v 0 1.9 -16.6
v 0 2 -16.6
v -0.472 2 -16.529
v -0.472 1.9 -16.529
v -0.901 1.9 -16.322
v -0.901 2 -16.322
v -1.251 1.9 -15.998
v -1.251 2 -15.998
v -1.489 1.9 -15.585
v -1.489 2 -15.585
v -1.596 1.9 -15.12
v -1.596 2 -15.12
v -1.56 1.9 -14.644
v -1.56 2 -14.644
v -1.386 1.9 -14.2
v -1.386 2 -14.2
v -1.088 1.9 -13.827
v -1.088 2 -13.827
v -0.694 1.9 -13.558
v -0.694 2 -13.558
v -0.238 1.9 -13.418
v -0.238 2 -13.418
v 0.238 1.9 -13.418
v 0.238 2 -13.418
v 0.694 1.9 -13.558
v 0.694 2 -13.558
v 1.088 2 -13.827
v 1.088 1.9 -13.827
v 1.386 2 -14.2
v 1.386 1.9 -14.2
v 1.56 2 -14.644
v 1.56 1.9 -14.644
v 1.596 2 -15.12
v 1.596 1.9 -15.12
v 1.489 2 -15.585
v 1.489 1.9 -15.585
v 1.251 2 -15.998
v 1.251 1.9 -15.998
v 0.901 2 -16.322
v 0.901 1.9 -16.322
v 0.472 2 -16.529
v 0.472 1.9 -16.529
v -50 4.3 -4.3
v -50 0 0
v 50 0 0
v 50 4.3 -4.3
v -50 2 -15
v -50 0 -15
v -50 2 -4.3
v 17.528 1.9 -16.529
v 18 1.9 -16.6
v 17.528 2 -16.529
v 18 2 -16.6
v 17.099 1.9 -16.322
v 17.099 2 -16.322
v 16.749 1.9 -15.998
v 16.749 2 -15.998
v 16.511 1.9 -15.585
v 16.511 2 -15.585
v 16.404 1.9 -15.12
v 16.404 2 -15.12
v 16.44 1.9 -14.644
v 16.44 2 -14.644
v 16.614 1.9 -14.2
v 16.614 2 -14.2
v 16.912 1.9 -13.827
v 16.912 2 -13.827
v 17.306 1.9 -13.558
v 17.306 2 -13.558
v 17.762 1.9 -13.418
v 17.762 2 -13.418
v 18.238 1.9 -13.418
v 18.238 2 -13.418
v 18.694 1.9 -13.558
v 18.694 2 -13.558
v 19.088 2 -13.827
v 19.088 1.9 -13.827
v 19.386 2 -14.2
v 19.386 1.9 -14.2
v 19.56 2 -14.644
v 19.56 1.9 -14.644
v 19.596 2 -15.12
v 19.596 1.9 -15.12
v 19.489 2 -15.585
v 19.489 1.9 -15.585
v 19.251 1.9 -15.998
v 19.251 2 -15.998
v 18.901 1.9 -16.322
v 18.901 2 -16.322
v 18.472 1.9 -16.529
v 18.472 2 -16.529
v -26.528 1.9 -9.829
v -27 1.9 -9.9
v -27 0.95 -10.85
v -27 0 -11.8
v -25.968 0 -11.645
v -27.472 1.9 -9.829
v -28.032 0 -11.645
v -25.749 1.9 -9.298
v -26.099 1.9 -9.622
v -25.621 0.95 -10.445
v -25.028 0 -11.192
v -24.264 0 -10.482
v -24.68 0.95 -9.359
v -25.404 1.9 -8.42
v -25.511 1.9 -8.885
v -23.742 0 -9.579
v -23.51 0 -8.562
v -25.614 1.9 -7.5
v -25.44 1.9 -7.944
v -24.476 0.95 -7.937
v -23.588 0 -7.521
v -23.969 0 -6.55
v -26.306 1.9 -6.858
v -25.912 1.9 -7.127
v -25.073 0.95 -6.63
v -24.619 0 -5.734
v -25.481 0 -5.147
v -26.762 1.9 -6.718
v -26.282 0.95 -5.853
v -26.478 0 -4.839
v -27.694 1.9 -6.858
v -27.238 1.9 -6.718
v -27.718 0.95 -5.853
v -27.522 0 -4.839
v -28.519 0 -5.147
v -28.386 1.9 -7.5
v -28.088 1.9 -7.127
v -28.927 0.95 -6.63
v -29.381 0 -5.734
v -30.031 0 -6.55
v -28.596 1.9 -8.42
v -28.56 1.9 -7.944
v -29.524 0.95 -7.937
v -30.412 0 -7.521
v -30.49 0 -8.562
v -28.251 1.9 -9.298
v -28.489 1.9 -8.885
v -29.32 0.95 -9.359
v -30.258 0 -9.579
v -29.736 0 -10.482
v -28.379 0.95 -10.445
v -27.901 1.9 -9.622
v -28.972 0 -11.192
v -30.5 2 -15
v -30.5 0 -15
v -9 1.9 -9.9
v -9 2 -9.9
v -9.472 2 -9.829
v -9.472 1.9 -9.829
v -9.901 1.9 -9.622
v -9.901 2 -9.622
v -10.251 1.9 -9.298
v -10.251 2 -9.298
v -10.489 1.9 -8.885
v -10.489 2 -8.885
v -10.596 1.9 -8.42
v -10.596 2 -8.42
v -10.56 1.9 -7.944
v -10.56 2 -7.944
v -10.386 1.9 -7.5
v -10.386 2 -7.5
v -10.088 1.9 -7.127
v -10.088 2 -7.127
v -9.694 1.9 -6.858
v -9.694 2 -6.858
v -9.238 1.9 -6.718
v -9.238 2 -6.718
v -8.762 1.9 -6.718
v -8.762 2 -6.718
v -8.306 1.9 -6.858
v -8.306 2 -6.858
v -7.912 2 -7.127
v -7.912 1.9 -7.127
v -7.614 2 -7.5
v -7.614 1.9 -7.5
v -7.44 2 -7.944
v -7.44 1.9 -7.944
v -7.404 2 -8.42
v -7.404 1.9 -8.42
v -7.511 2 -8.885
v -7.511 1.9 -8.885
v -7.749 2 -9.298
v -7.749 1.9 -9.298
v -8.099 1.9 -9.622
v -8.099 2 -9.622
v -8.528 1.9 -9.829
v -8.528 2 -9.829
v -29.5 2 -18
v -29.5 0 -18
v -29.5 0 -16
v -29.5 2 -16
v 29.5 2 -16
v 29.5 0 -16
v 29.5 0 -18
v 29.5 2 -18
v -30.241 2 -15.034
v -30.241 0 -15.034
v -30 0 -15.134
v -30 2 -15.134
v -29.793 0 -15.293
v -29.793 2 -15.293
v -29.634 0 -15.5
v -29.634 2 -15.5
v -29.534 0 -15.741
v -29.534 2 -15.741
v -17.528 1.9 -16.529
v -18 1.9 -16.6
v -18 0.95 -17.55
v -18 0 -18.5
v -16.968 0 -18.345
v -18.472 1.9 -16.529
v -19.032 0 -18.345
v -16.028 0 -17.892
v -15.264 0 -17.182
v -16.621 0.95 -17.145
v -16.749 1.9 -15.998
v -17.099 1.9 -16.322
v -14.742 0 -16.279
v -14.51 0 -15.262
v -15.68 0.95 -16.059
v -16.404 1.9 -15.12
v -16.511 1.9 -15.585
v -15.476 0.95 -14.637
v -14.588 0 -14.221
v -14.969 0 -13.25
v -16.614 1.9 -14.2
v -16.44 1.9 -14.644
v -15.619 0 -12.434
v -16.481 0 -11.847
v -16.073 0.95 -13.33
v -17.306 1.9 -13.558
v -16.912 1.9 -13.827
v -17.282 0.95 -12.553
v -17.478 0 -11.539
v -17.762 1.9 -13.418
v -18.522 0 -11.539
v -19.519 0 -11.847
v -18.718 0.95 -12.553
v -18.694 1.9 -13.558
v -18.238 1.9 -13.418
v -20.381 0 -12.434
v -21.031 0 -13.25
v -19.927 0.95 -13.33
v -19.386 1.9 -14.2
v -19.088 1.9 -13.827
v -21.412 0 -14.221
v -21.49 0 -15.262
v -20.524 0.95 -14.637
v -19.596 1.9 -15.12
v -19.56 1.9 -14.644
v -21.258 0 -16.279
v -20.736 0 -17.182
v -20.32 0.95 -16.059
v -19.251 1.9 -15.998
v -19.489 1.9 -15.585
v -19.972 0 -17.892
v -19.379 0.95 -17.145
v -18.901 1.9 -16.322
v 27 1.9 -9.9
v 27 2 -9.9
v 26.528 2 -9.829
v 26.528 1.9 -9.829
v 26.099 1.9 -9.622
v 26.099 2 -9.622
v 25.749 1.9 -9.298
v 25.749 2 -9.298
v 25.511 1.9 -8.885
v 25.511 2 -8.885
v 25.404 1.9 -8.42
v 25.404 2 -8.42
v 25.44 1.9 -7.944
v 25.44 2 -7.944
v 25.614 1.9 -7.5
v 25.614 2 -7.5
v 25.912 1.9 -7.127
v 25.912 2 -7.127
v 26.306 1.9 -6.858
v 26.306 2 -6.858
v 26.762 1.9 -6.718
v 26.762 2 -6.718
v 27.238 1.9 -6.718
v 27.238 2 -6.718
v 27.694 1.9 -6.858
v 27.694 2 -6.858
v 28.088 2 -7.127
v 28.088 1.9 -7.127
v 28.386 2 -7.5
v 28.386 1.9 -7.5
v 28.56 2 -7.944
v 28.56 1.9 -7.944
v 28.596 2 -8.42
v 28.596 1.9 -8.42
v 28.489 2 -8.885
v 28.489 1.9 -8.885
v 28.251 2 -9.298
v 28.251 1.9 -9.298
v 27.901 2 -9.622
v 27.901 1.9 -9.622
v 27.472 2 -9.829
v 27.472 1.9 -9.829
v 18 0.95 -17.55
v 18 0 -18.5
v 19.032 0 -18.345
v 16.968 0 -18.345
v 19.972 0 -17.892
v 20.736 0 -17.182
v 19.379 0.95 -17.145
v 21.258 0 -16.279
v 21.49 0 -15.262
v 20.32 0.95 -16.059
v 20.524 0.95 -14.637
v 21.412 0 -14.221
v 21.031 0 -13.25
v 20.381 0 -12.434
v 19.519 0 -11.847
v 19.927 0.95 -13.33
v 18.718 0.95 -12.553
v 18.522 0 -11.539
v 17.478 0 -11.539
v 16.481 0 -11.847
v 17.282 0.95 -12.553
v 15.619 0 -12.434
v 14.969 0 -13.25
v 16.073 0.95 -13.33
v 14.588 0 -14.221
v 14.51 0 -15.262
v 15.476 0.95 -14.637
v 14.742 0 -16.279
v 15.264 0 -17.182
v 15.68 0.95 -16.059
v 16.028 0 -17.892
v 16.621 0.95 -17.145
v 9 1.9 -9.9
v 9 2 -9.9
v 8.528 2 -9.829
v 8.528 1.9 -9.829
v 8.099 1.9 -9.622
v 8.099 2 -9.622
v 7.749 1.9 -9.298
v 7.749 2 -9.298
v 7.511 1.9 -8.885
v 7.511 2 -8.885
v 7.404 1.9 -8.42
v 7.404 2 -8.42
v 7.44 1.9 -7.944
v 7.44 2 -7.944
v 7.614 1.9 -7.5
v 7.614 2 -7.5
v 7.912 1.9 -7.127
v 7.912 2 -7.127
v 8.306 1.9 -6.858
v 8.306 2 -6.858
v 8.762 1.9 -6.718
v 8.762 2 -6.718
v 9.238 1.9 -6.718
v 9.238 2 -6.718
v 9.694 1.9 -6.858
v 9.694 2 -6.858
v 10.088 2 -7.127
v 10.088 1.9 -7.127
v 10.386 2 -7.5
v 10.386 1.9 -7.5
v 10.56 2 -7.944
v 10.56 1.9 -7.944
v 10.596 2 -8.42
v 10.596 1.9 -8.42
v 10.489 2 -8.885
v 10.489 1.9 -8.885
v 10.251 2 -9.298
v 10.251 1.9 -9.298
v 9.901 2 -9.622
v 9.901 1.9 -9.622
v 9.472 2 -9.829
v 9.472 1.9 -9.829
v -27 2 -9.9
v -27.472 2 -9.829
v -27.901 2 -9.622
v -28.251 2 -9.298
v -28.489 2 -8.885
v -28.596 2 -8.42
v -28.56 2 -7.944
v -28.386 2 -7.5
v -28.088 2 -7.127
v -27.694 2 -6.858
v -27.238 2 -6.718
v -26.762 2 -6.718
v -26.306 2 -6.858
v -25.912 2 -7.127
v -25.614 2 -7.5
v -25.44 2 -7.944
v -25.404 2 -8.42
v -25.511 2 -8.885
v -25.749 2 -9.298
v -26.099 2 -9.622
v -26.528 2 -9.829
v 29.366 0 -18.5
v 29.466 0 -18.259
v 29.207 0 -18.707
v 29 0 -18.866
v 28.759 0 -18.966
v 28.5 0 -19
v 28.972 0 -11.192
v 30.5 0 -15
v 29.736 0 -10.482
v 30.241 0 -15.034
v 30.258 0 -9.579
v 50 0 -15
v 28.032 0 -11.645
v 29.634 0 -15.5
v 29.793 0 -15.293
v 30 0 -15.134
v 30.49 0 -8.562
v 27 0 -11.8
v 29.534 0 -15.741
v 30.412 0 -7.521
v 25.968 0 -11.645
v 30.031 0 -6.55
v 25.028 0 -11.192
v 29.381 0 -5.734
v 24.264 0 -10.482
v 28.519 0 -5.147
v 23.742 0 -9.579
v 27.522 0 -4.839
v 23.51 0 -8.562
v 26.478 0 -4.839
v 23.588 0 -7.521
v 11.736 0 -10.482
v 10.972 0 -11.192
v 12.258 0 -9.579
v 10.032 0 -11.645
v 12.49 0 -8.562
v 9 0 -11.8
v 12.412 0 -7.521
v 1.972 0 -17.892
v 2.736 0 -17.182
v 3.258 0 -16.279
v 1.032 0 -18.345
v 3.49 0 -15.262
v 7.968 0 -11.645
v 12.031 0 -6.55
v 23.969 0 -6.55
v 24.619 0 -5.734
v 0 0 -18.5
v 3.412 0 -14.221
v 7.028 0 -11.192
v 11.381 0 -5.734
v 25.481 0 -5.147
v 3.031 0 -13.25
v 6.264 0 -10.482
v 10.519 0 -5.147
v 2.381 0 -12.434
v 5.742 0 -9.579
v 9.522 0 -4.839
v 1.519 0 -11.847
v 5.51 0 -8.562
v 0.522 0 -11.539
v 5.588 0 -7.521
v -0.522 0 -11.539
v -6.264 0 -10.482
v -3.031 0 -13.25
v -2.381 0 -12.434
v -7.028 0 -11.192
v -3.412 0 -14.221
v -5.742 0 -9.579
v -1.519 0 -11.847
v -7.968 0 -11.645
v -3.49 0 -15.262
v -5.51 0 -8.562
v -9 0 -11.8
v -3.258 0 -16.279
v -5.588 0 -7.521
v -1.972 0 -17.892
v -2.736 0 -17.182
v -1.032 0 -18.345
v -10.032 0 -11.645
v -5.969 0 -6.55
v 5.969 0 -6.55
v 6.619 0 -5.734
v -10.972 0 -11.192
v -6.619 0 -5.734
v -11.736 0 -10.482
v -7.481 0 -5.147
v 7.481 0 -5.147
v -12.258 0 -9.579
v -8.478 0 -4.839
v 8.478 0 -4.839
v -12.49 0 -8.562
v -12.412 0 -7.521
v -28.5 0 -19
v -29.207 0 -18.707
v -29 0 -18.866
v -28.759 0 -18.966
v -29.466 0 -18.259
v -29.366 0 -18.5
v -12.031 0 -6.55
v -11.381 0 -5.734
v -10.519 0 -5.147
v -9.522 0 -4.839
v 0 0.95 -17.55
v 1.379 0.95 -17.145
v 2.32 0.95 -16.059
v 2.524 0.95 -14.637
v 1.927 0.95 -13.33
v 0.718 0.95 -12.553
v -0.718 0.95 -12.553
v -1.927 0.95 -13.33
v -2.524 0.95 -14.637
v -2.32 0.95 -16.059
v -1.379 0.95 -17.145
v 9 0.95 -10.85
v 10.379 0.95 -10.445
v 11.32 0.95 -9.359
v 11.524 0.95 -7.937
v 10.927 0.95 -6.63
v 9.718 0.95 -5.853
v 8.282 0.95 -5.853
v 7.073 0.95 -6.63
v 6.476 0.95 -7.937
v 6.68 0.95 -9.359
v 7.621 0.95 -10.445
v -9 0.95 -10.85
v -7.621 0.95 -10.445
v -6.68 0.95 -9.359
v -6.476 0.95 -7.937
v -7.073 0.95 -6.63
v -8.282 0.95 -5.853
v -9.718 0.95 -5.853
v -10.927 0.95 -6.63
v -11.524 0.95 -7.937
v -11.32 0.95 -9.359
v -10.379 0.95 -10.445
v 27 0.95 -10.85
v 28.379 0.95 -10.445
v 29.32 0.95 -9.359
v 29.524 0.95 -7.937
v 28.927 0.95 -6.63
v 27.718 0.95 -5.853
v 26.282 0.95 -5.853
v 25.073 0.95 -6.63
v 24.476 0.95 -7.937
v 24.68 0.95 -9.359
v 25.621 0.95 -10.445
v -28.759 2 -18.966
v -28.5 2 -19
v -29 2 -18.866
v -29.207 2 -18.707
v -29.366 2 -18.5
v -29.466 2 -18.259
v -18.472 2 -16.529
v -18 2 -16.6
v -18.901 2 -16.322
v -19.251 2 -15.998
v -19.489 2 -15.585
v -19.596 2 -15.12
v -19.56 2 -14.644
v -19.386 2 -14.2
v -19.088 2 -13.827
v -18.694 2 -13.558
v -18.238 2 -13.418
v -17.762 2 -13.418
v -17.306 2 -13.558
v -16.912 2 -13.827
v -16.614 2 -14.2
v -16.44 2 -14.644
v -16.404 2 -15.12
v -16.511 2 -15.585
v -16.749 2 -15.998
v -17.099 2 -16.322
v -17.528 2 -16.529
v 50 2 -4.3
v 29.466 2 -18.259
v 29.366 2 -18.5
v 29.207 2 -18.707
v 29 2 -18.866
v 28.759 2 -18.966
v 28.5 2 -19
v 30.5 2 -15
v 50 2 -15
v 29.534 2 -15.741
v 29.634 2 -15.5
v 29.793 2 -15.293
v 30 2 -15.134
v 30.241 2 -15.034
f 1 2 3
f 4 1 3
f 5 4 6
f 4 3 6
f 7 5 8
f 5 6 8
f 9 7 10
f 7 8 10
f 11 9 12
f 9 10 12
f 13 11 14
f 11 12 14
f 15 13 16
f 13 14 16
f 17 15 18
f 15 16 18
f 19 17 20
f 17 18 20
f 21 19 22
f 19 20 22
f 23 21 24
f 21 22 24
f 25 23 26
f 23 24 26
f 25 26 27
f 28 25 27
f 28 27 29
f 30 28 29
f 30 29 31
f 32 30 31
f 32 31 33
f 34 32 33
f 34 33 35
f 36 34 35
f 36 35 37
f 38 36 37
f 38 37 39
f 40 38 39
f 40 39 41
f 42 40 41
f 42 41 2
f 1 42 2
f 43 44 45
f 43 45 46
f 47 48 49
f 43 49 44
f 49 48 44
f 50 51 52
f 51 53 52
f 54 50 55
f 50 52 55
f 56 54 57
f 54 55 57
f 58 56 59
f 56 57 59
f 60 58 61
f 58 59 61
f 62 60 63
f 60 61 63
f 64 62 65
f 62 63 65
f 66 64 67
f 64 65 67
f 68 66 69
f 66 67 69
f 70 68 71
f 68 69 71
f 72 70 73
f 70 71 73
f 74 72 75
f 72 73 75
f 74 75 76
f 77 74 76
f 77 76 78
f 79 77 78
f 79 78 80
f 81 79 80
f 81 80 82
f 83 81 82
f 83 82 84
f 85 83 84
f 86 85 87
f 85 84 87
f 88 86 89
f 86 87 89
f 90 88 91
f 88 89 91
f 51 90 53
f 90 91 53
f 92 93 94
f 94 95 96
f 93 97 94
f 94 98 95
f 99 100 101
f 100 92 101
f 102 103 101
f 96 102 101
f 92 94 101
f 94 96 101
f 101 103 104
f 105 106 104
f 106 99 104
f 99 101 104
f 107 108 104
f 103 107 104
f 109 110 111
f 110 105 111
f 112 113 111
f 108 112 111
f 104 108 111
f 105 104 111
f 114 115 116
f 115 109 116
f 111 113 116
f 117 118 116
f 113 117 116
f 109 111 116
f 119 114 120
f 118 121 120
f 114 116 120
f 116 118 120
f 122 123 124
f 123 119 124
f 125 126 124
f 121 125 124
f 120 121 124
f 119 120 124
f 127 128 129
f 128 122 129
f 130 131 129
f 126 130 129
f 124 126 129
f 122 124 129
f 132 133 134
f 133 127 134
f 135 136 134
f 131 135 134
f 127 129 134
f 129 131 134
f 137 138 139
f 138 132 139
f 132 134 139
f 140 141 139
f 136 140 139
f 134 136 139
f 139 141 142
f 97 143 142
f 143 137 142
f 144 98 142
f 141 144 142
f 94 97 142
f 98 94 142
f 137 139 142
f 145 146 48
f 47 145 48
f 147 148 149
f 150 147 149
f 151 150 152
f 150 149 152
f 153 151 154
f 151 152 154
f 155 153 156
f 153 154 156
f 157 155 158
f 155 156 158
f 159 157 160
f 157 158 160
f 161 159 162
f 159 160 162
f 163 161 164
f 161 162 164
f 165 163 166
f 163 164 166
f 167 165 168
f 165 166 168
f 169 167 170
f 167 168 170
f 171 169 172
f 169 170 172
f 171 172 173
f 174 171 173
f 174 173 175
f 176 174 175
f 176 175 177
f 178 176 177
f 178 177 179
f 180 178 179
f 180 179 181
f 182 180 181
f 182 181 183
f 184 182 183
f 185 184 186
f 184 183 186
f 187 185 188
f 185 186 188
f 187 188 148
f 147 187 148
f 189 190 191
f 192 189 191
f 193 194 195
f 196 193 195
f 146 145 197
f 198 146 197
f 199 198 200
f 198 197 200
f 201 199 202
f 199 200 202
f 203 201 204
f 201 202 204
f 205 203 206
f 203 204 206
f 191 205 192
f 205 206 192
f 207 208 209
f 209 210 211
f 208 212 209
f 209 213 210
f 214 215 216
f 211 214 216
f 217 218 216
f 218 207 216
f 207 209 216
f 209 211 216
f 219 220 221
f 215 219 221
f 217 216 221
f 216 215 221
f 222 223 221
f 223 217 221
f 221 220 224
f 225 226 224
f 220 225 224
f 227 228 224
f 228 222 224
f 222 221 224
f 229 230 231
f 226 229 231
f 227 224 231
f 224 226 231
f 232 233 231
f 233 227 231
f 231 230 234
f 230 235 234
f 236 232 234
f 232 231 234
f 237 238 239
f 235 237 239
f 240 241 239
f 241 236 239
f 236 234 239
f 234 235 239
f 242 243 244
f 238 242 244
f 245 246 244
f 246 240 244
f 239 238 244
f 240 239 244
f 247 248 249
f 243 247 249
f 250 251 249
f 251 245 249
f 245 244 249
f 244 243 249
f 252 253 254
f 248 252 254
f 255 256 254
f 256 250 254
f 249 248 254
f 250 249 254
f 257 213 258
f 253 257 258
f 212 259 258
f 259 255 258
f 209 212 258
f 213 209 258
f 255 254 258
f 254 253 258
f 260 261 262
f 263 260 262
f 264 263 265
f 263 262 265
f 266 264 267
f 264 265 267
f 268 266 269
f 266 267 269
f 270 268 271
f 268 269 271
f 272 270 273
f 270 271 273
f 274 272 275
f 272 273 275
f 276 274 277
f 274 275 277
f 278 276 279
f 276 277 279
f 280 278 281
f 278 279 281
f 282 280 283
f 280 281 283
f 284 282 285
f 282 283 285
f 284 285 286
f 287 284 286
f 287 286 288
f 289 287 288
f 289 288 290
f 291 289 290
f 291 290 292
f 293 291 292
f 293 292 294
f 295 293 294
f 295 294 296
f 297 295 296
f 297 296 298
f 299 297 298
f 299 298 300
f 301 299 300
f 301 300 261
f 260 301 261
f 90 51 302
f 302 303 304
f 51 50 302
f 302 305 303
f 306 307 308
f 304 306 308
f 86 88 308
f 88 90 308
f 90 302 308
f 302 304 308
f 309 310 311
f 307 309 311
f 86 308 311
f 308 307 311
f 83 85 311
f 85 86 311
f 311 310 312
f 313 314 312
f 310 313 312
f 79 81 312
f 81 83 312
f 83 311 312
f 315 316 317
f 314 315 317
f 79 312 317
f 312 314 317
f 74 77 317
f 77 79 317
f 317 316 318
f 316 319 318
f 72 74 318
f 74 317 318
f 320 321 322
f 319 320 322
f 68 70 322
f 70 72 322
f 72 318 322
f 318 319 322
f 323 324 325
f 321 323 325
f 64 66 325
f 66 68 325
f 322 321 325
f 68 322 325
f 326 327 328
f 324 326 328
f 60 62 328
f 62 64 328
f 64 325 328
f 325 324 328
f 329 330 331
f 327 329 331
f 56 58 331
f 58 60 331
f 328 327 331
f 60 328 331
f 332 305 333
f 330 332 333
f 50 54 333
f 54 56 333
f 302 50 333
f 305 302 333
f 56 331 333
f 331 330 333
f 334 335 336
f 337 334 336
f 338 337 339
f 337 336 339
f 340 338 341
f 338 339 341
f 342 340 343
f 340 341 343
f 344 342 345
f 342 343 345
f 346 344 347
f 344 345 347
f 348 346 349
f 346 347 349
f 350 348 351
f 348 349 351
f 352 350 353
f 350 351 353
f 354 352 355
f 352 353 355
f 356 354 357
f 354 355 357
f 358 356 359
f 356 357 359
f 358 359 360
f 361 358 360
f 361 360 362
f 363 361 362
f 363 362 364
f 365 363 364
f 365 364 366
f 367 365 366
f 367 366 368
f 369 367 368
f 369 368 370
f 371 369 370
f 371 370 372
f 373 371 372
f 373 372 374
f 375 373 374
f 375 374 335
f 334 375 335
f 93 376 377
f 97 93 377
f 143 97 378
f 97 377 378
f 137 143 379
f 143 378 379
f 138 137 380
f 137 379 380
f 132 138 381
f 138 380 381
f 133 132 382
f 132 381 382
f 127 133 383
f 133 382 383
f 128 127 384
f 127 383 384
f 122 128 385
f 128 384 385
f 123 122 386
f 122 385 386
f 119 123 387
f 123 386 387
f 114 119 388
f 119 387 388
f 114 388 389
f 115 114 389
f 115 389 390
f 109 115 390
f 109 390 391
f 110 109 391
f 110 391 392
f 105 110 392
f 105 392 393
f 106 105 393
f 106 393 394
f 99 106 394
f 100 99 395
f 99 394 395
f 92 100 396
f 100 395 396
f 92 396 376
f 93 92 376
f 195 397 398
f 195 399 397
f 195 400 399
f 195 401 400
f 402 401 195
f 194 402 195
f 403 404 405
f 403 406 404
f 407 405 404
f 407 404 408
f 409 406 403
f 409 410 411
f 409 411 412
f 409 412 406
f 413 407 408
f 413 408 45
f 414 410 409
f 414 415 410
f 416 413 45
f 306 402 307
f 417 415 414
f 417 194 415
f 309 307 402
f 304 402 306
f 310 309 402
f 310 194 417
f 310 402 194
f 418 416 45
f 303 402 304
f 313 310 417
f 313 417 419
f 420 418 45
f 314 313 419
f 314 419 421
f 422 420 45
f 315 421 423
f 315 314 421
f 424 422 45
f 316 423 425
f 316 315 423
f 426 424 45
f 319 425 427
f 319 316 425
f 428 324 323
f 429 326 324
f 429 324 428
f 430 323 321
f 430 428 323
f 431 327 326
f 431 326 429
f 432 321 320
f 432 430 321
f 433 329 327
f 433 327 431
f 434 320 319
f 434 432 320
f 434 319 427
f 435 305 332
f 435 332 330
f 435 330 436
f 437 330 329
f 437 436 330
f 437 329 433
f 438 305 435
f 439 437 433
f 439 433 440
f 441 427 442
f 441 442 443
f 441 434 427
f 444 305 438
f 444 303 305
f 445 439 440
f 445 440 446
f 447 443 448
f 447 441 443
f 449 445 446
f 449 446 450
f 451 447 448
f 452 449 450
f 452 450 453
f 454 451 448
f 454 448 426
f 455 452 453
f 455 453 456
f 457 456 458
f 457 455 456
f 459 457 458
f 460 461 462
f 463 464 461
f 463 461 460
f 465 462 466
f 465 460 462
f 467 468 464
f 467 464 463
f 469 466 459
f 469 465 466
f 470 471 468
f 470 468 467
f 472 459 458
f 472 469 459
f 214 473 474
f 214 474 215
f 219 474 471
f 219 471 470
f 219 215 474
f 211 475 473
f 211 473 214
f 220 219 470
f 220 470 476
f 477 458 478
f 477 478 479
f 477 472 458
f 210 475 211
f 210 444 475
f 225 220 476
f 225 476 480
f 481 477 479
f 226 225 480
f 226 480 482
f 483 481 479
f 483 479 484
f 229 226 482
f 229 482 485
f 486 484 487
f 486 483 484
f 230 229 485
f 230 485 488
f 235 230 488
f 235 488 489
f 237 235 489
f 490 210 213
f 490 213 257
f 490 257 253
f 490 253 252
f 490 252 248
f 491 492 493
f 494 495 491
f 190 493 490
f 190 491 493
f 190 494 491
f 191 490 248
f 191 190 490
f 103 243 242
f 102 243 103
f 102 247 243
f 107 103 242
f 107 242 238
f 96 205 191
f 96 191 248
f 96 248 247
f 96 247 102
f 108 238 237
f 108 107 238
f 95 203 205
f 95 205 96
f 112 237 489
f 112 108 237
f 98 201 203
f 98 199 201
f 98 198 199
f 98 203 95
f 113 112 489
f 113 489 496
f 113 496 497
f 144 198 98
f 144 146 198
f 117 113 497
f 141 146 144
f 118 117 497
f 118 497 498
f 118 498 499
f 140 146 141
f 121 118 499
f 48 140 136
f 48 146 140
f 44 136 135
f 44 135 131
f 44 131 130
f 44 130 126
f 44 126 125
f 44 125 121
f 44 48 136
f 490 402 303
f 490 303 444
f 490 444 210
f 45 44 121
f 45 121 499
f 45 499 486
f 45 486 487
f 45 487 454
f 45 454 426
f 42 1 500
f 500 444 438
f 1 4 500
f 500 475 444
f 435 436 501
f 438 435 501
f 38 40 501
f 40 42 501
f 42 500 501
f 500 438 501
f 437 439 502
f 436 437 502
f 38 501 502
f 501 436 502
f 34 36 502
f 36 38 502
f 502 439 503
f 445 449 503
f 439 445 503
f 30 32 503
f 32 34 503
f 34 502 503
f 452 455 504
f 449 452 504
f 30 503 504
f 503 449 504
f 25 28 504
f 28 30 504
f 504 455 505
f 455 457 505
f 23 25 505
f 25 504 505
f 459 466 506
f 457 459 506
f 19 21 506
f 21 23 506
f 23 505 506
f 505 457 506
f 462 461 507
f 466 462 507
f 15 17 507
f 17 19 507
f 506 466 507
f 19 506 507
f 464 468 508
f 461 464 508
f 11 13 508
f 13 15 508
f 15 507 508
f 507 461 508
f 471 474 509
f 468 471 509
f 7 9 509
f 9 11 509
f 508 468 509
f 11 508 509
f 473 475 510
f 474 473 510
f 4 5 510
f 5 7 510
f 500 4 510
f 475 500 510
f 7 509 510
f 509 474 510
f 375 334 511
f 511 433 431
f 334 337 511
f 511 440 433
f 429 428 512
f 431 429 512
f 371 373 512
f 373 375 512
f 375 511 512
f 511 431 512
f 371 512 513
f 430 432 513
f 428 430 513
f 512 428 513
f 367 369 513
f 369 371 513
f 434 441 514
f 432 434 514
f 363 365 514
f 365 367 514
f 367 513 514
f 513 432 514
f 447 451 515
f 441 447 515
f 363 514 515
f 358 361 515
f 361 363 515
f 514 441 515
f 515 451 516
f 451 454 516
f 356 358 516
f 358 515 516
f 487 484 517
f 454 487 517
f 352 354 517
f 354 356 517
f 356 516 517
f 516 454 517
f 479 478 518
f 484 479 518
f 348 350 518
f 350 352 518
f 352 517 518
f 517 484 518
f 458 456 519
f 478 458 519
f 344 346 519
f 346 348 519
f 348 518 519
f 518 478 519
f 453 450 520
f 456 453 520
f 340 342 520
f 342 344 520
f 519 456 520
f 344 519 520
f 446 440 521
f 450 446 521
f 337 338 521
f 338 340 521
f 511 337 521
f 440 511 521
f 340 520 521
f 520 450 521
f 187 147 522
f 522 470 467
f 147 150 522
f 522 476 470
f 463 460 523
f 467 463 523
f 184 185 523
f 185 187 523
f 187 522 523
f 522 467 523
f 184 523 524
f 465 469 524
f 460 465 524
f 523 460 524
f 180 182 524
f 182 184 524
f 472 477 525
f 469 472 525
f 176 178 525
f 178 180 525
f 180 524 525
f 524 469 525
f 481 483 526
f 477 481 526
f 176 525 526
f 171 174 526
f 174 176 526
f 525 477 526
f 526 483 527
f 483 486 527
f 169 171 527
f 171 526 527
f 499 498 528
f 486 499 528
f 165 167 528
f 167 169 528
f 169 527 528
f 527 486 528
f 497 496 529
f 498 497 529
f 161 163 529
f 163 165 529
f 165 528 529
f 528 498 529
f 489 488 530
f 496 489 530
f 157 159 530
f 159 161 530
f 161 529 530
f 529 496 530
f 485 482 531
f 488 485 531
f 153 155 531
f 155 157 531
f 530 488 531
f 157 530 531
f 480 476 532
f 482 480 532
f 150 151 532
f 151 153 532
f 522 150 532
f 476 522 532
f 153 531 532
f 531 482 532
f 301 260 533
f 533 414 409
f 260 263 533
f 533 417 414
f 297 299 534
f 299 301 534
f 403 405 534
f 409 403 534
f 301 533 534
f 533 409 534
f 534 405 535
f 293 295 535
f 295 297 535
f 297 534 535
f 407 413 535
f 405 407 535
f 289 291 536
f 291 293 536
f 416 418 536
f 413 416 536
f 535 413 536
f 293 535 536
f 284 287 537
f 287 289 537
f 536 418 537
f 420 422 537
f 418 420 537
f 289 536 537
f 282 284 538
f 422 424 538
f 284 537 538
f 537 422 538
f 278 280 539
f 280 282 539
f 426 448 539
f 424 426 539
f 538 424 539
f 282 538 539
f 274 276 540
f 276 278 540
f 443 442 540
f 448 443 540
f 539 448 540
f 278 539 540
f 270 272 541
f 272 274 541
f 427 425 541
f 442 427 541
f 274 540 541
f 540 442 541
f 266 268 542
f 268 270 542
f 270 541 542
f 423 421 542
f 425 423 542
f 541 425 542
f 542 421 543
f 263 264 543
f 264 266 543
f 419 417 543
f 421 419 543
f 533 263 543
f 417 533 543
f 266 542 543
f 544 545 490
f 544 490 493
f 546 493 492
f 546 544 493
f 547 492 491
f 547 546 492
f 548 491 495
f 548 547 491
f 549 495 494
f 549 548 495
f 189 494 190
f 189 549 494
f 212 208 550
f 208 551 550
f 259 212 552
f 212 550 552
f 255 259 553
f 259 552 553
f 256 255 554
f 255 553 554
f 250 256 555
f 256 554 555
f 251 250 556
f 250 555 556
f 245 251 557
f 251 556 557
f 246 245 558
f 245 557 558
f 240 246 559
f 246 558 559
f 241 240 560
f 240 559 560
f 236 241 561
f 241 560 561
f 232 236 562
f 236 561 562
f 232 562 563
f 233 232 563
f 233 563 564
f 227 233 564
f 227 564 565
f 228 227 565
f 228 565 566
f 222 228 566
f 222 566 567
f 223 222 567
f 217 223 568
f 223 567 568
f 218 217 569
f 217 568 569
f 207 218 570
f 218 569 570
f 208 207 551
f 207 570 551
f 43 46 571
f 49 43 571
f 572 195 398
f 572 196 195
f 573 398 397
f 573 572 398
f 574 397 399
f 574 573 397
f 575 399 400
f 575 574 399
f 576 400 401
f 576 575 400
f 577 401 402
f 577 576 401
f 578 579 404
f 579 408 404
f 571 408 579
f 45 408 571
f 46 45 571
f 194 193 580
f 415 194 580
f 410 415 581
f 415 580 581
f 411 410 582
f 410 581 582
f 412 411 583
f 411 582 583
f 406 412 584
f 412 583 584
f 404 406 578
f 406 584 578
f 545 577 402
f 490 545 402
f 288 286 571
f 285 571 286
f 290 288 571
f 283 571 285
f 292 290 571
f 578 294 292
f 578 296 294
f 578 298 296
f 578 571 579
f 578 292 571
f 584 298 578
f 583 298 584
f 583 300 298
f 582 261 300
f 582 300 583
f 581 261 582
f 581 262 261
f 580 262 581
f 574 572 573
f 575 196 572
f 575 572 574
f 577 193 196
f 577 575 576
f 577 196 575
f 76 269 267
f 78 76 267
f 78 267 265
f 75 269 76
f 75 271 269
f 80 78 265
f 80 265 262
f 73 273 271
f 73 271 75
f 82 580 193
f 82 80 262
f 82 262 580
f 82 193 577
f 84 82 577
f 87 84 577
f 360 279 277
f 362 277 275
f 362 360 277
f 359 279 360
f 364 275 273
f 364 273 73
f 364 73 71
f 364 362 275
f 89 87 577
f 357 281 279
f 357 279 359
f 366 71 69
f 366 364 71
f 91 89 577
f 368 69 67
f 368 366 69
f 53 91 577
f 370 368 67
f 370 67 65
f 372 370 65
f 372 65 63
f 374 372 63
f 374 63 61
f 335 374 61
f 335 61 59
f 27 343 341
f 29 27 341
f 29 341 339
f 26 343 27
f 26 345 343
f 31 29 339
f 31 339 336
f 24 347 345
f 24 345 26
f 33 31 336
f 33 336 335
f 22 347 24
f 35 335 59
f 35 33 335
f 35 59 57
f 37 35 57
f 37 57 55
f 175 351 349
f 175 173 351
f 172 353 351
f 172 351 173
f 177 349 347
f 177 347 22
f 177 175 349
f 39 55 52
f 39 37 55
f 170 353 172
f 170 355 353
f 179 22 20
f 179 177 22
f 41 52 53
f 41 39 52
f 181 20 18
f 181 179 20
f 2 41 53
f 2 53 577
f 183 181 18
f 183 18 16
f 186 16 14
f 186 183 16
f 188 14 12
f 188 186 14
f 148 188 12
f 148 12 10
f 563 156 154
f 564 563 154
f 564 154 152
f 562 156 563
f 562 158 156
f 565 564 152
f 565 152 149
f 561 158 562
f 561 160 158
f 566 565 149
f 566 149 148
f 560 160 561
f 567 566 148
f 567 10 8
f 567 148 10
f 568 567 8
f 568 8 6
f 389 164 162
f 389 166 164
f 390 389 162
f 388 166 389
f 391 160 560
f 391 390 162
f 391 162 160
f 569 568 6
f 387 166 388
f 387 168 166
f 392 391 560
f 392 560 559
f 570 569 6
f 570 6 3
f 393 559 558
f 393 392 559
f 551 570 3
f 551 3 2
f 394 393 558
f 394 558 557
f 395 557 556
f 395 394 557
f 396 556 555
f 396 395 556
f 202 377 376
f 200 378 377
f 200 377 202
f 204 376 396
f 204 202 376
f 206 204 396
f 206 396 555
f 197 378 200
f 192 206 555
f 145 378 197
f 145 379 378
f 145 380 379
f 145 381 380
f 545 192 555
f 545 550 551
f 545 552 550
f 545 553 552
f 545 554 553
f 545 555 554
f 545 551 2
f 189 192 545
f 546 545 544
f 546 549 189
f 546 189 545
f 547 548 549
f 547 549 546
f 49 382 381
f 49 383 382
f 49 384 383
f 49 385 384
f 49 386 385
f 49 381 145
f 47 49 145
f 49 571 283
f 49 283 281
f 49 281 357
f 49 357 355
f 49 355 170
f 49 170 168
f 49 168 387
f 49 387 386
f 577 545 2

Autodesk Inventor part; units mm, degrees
ref_plane "YZ Plane" through (0, 0, 0) normal (1, 0, 0) x (0, 1, 0)
ref_plane "XZ Plane" through (0, 0, 0) normal (0, 1, 0) x (-1, 0, 0)
ref_plane "XY Plane" through (0, 0, 0) normal (0, 0, 1) x (1, 0, 0)
sketch "Szkic1" plane through (0, 0, 0) normal (1, 0, 0) x (0, 1, 0)
  line L0 (0, 0) -> (2, -2)
  line L1 (2, -2) -> (2, -19)
  line L2 (2, -19) -> (0, -19)
  line L3 (0, -19) -> (0, -2)
  line L4 (0, -2) -> (0, 0)
  line L5 (0, -2) -> (2, -2)
  line L6 (2, -2) -> (4.3, -4.3)
  line L7 (4.3, -4.3) -> (2, -4.3)
  line L8 (2, -2) -> (4.3, -4.3)
  line L9 (4.3, -4.3) -> (2, -4.3)
  line L10 (4, -4) -> (4, -4.3) construction
  line L11 (4, -4) -> (2, -4) construction
  line L12 (4.3, -4.3) -> (4.3, -4.8)
  line L13 (4.3, -4.8) -> (2, -4.8)
  line L14 (0, 0) -> (-0.5, 0)
  line L15 (-0.5, 0) -> (-0.5, -19)
  line L16 (-0.5, -19) -> (0, -19)
  line L17 (0, -19) -> (0, 0)
  point P0 (5, -5)
  point P1 (4.3, -4.3)
  dimension "d1" = 2
  dimension "d2" = 45
  dimension "d44" = 45
  dimension "d45" = 2
  dimension "d46" = 17
  dimension "d50" = -4.3
  dimension "d51" = 19
  dimension "d54" = 0
  dimension "d98" = 2.3
  dimension "d125" = 4
  dimension "d126" = 0.3
  dimension "d156" = 0.5
  dimension "d157" = 0.5
extrude "Wyciągnięcie proste1" add sketch "Szkic1" along normal mid plane 100 contours L0 L5 L4 | L6 L7 L1 | L1 L2 L3 L5
sketch "Sketch4" plane through (-50, 0, -19) normal (0, -1, 0) x (1, 0, 0)
  line L0 (0, 0) -> (0, 19) projected
  line L1 (0, 0) -> (100, 0) projected
  line L2 (100, 19) -> (100, 0) projected
  line L3 (100, 19) -> (0, 19) projected
  line L4 (80, 0) -> (80, 19)
  line L5 (100, 19) -> (50, 19) projected
  line L6 (20, 19) -> (20, 0)
  line L7 (0, 0) -> (100, 0) projected
  line L8 (0, 14.7) -> (100, 14.7) projected
  circle A0 centre (77, 10.7) radius 3
  circle A1 centre (41, 10.7) radius 3
  circle A2 centre (23, 10.7) radius 3
  line L9 (80, 10.7) -> (20, 10.7)
  line L10 (80, 4) -> (20, 4)
  circle A3 centre (59, 10.7) radius 3
  circle A4 centre (68, 4) radius 3
  circle A5 centre (50, 4) radius 3
  circle A6 centre (32, 4) radius 3
  dimension "d67" = 6
  dimension "d70" = 6
  dimension "d22" = 20
  dimension "d23" = 20
  dimension "d69" = 6
  dimension "d75" = 18
  dimension "d127" = 6
  dimension "d129" = 18
  dimension "d139" = 18
  dimension "d140" = 6
  dimension "d141" = 6
  dimension "d142" = 6
  dimension "d143" = 9
  dimension "d144" = 9
  dimension "d145" = 9
  dimension "d146" = 9
  dimension "d147" = 9
  dimension "d148" = 9
  dimension "d149" = 4
  dimension "d150" = 4
hole "Hole2" at (27, 0, -8.3) at (-9, 0, -8.3) at (-27, 0, -8.3) at (9, 0, -8.3) at (0, 0, -15) at (18, 0, -15) at (-18, 0, -15) direction (0, 1, 0) diameter 3.2 depth 8.8 countersink diameter 7 countersink angle 90 clearance for "Countersunk Flat Head Screw ISO 2009/7046" size "M3" standard "ISO"
extrude "Extrusion7" [suppressed]
sketch "Sketch5" plane through (-50, 0, 0) normal (0, -1, 0) x (1, 0, 0)
  line L0 (100, 0) -> (100, -19) projected
  line L1 (100, 0) -> (0, 0) projected
  line L2 (0, -19) -> (0, 0) projected
  line L3 (100, -15) -> (79.5, -15)
  line L4 (79.5, -15) -> (79.5, -32.132)
  line L5 (79.5, -32.132) -> (100, -32.132)
  line L6 (100, -32.132) -> (100, -15)
  line L7 (0, -19) -> (20.5, -19)
  line L8 (20.5, -19) -> (20.5, -15)
  line L9 (20.5, -15) -> (0, -15)
  line L10 (0, -15) -> (0, -19)
  circle A0 centre (23, -8.3) radius 3.5 projected
  circle A1 centre (41, -8.3) radius 3.5 projected
  circle A2 centre (77, -8.3) radius 3.5 projected
  line L11 (0, -19) -> (100, -19) projected
  point P0 (50, 0)
  point P1 (0, -15)
  point P2 (100, -30)
  dimension "d55" = 20.5
  dimension "d56" = 20.5
  dimension "d61" = 15
  dimension "d62" = 15
extrude "Extrusion5" cut sketch "Sketch5" along normal through all both and the other way through all contours L0 L11 L4 L3 | L6 L5 L4 L11 | L9 L8 L7 L2
fillet "Fillet2" radius 1 2 edges at (-29.5, 1, -19) (29.5, 1, -19)
fillet "Fillet3" radius 1 2 edges at (-29.5, 1, -15) (29.5, 1, -15)
sketch "Sketch10" plane through (50, 0, 0) normal (1, 0, 0) x (0, 0, -1)
  line L0 (30.7582, 13.788) -> (30.3919, 3.2994) projected
  line L1 (30.5751, 8.5437) -> (-8.4118, 9.9052)
  line L2 (15, 0) -> (15, 2) projected
  line L3 (15, 2) -> (4.3, 2) projected
  line L4 (4.3, 2) -> (4.3, 4.3) projected
  line L5 (4.3, 4.3) -> (0, 0) projected
  line L6 (0, 0) -> (15, 0) projected
  line L7 (4.3, 2) -> (15, 2) projected
  line L8 (4.3, 2) -> (3.8, 2)
  circle A0 centre (63.2278, 12.35) radius 15 projected
  line L9 (63.2278, 12.35) -> (63.2278, -2.65)
  line L10 (63.2278, -2.65) -> (0, 0)
  line L11 (0, 0) -> (0.1802, 4.3)
  line L12 (0.1802, 4.3) -> (3.8, 4.3)
  line L13 (3.8, 4.3) -> (3.8, 2)
  line L14 (3.8, 4.3) -> (4.3, 4.3) construction
  point P0 (3.8, 3.8)
  dimension "d166" = 90
  dimension "d167" = 0.5
extrude "Extrusion9" [suppressed]
sketch "Sketch11" plane through (50, 0, 0) normal (1, 0, 0) x (0, 0, -1)
  line L0 (3.8, 4.3) -> (3.8, 2) projected
  line L1 (4.3, 2) -> (3.8, 2) projected
  line L2 (4.3, 2) -> (4.3, 4.3) projected
  line L3 (4.3, 4.3) -> (0, 0) projected
  point P0 (3.8, 3.8)
extrude "Extrusion10" [suppressed]
sketch "Sketch12" plane through (-28.5, 0, -19) normal (0, -1, 0) x (1, 0, 0)
  arc A0 (57, 0) -> (58, 1) centre (57, 1) ccw projected
  line L0 (58, 1) -> (58, 3) projected
  arc A1 (59, 4) -> (58, 3) centre (59, 3) ccw projected
  line L1 (59, 4) -> (78.5, 4) projected
  line L2 (78.5, 19) -> (78.5, 4) projected
  line L3 (78.5, 19) -> (-21.5, 19) projected
  line L4 (-21.5, 4) -> (-21.5, 19) projected
  line L5 (-21.5, 4) -> (-2, 4) projected
  arc A2 (-1, 3) -> (-2, 4) centre (-2, 3) ccw projected
  line L6 (-1, 3) -> (-1, 1) projected
  arc A3 (-1, 1) -> (0, 0) centre (0, 1) ccw projected
  line L7 (0, 0) -> (57, 0) projected
  circle A4 centre (55.5, 10.7) radius 3.5 projected
  circle A5 centre (19.5, 10.7) radius 3.5 projected
  circle A6 centre (1.5, 10.7) radius 3.5 projected
  circle A7 centre (37.5, 10.7) radius 3.5 projected
  circle A8 centre (28.5, 4) radius 3.5 projected
  circle A9 centre (46.5, 4) radius 3.5 projected
  circle A10 centre (10.5, 4) radius 3.5 projected
  arc A11 (57, 0.5) -> (57.5, 1) centre (57, 1) ccw
  line L8 (57.5, 1) -> (57.5, 3)
  arc A12 (59, 4.5) -> (57.5, 3) centre (59, 3) ccw
  line L9 (59, 4.5) -> (78, 4.5)
  line L10 (78, 4.5) -> (78, 18.5)
  line L11 (78, 18.5) -> (-21, 18.5)
  line L12 (-21, 18.5) -> (-21, 4.5)
  line L13 (-21, 4.5) -> (-2, 4.5)
  arc A13 (-0.5, 3) -> (-2, 4.5) centre (-2, 3) ccw
  line L14 (-0.5, 3) -> (-0.5, 1)
  arc A14 (-0.5, 1) -> (0, 0.5) centre (0, 1) ccw
  line L15 (0, 0.5) -> (57, 0.5)
  line L16 (57, 0.5) -> (57.866, 0.5)
  line L17 (0, 0.5) -> (-0.866, 0.5)
  point P0 (28.5, 19)
  dimension "d172" = 0.5
extrude "Extrusion11" [suppressed]
fillet "Fillet4" [suppressed]
equation "\"d23\" = d22"
equation "\"d56\" = d55"
equation "\"d62\" = d61"
equation "\"d64\" = d80"
equation "\"d79\" = d64"
equation "\"d80\" = 4.648267"
properties part number "Plog2" material "Steel, Carbon"
